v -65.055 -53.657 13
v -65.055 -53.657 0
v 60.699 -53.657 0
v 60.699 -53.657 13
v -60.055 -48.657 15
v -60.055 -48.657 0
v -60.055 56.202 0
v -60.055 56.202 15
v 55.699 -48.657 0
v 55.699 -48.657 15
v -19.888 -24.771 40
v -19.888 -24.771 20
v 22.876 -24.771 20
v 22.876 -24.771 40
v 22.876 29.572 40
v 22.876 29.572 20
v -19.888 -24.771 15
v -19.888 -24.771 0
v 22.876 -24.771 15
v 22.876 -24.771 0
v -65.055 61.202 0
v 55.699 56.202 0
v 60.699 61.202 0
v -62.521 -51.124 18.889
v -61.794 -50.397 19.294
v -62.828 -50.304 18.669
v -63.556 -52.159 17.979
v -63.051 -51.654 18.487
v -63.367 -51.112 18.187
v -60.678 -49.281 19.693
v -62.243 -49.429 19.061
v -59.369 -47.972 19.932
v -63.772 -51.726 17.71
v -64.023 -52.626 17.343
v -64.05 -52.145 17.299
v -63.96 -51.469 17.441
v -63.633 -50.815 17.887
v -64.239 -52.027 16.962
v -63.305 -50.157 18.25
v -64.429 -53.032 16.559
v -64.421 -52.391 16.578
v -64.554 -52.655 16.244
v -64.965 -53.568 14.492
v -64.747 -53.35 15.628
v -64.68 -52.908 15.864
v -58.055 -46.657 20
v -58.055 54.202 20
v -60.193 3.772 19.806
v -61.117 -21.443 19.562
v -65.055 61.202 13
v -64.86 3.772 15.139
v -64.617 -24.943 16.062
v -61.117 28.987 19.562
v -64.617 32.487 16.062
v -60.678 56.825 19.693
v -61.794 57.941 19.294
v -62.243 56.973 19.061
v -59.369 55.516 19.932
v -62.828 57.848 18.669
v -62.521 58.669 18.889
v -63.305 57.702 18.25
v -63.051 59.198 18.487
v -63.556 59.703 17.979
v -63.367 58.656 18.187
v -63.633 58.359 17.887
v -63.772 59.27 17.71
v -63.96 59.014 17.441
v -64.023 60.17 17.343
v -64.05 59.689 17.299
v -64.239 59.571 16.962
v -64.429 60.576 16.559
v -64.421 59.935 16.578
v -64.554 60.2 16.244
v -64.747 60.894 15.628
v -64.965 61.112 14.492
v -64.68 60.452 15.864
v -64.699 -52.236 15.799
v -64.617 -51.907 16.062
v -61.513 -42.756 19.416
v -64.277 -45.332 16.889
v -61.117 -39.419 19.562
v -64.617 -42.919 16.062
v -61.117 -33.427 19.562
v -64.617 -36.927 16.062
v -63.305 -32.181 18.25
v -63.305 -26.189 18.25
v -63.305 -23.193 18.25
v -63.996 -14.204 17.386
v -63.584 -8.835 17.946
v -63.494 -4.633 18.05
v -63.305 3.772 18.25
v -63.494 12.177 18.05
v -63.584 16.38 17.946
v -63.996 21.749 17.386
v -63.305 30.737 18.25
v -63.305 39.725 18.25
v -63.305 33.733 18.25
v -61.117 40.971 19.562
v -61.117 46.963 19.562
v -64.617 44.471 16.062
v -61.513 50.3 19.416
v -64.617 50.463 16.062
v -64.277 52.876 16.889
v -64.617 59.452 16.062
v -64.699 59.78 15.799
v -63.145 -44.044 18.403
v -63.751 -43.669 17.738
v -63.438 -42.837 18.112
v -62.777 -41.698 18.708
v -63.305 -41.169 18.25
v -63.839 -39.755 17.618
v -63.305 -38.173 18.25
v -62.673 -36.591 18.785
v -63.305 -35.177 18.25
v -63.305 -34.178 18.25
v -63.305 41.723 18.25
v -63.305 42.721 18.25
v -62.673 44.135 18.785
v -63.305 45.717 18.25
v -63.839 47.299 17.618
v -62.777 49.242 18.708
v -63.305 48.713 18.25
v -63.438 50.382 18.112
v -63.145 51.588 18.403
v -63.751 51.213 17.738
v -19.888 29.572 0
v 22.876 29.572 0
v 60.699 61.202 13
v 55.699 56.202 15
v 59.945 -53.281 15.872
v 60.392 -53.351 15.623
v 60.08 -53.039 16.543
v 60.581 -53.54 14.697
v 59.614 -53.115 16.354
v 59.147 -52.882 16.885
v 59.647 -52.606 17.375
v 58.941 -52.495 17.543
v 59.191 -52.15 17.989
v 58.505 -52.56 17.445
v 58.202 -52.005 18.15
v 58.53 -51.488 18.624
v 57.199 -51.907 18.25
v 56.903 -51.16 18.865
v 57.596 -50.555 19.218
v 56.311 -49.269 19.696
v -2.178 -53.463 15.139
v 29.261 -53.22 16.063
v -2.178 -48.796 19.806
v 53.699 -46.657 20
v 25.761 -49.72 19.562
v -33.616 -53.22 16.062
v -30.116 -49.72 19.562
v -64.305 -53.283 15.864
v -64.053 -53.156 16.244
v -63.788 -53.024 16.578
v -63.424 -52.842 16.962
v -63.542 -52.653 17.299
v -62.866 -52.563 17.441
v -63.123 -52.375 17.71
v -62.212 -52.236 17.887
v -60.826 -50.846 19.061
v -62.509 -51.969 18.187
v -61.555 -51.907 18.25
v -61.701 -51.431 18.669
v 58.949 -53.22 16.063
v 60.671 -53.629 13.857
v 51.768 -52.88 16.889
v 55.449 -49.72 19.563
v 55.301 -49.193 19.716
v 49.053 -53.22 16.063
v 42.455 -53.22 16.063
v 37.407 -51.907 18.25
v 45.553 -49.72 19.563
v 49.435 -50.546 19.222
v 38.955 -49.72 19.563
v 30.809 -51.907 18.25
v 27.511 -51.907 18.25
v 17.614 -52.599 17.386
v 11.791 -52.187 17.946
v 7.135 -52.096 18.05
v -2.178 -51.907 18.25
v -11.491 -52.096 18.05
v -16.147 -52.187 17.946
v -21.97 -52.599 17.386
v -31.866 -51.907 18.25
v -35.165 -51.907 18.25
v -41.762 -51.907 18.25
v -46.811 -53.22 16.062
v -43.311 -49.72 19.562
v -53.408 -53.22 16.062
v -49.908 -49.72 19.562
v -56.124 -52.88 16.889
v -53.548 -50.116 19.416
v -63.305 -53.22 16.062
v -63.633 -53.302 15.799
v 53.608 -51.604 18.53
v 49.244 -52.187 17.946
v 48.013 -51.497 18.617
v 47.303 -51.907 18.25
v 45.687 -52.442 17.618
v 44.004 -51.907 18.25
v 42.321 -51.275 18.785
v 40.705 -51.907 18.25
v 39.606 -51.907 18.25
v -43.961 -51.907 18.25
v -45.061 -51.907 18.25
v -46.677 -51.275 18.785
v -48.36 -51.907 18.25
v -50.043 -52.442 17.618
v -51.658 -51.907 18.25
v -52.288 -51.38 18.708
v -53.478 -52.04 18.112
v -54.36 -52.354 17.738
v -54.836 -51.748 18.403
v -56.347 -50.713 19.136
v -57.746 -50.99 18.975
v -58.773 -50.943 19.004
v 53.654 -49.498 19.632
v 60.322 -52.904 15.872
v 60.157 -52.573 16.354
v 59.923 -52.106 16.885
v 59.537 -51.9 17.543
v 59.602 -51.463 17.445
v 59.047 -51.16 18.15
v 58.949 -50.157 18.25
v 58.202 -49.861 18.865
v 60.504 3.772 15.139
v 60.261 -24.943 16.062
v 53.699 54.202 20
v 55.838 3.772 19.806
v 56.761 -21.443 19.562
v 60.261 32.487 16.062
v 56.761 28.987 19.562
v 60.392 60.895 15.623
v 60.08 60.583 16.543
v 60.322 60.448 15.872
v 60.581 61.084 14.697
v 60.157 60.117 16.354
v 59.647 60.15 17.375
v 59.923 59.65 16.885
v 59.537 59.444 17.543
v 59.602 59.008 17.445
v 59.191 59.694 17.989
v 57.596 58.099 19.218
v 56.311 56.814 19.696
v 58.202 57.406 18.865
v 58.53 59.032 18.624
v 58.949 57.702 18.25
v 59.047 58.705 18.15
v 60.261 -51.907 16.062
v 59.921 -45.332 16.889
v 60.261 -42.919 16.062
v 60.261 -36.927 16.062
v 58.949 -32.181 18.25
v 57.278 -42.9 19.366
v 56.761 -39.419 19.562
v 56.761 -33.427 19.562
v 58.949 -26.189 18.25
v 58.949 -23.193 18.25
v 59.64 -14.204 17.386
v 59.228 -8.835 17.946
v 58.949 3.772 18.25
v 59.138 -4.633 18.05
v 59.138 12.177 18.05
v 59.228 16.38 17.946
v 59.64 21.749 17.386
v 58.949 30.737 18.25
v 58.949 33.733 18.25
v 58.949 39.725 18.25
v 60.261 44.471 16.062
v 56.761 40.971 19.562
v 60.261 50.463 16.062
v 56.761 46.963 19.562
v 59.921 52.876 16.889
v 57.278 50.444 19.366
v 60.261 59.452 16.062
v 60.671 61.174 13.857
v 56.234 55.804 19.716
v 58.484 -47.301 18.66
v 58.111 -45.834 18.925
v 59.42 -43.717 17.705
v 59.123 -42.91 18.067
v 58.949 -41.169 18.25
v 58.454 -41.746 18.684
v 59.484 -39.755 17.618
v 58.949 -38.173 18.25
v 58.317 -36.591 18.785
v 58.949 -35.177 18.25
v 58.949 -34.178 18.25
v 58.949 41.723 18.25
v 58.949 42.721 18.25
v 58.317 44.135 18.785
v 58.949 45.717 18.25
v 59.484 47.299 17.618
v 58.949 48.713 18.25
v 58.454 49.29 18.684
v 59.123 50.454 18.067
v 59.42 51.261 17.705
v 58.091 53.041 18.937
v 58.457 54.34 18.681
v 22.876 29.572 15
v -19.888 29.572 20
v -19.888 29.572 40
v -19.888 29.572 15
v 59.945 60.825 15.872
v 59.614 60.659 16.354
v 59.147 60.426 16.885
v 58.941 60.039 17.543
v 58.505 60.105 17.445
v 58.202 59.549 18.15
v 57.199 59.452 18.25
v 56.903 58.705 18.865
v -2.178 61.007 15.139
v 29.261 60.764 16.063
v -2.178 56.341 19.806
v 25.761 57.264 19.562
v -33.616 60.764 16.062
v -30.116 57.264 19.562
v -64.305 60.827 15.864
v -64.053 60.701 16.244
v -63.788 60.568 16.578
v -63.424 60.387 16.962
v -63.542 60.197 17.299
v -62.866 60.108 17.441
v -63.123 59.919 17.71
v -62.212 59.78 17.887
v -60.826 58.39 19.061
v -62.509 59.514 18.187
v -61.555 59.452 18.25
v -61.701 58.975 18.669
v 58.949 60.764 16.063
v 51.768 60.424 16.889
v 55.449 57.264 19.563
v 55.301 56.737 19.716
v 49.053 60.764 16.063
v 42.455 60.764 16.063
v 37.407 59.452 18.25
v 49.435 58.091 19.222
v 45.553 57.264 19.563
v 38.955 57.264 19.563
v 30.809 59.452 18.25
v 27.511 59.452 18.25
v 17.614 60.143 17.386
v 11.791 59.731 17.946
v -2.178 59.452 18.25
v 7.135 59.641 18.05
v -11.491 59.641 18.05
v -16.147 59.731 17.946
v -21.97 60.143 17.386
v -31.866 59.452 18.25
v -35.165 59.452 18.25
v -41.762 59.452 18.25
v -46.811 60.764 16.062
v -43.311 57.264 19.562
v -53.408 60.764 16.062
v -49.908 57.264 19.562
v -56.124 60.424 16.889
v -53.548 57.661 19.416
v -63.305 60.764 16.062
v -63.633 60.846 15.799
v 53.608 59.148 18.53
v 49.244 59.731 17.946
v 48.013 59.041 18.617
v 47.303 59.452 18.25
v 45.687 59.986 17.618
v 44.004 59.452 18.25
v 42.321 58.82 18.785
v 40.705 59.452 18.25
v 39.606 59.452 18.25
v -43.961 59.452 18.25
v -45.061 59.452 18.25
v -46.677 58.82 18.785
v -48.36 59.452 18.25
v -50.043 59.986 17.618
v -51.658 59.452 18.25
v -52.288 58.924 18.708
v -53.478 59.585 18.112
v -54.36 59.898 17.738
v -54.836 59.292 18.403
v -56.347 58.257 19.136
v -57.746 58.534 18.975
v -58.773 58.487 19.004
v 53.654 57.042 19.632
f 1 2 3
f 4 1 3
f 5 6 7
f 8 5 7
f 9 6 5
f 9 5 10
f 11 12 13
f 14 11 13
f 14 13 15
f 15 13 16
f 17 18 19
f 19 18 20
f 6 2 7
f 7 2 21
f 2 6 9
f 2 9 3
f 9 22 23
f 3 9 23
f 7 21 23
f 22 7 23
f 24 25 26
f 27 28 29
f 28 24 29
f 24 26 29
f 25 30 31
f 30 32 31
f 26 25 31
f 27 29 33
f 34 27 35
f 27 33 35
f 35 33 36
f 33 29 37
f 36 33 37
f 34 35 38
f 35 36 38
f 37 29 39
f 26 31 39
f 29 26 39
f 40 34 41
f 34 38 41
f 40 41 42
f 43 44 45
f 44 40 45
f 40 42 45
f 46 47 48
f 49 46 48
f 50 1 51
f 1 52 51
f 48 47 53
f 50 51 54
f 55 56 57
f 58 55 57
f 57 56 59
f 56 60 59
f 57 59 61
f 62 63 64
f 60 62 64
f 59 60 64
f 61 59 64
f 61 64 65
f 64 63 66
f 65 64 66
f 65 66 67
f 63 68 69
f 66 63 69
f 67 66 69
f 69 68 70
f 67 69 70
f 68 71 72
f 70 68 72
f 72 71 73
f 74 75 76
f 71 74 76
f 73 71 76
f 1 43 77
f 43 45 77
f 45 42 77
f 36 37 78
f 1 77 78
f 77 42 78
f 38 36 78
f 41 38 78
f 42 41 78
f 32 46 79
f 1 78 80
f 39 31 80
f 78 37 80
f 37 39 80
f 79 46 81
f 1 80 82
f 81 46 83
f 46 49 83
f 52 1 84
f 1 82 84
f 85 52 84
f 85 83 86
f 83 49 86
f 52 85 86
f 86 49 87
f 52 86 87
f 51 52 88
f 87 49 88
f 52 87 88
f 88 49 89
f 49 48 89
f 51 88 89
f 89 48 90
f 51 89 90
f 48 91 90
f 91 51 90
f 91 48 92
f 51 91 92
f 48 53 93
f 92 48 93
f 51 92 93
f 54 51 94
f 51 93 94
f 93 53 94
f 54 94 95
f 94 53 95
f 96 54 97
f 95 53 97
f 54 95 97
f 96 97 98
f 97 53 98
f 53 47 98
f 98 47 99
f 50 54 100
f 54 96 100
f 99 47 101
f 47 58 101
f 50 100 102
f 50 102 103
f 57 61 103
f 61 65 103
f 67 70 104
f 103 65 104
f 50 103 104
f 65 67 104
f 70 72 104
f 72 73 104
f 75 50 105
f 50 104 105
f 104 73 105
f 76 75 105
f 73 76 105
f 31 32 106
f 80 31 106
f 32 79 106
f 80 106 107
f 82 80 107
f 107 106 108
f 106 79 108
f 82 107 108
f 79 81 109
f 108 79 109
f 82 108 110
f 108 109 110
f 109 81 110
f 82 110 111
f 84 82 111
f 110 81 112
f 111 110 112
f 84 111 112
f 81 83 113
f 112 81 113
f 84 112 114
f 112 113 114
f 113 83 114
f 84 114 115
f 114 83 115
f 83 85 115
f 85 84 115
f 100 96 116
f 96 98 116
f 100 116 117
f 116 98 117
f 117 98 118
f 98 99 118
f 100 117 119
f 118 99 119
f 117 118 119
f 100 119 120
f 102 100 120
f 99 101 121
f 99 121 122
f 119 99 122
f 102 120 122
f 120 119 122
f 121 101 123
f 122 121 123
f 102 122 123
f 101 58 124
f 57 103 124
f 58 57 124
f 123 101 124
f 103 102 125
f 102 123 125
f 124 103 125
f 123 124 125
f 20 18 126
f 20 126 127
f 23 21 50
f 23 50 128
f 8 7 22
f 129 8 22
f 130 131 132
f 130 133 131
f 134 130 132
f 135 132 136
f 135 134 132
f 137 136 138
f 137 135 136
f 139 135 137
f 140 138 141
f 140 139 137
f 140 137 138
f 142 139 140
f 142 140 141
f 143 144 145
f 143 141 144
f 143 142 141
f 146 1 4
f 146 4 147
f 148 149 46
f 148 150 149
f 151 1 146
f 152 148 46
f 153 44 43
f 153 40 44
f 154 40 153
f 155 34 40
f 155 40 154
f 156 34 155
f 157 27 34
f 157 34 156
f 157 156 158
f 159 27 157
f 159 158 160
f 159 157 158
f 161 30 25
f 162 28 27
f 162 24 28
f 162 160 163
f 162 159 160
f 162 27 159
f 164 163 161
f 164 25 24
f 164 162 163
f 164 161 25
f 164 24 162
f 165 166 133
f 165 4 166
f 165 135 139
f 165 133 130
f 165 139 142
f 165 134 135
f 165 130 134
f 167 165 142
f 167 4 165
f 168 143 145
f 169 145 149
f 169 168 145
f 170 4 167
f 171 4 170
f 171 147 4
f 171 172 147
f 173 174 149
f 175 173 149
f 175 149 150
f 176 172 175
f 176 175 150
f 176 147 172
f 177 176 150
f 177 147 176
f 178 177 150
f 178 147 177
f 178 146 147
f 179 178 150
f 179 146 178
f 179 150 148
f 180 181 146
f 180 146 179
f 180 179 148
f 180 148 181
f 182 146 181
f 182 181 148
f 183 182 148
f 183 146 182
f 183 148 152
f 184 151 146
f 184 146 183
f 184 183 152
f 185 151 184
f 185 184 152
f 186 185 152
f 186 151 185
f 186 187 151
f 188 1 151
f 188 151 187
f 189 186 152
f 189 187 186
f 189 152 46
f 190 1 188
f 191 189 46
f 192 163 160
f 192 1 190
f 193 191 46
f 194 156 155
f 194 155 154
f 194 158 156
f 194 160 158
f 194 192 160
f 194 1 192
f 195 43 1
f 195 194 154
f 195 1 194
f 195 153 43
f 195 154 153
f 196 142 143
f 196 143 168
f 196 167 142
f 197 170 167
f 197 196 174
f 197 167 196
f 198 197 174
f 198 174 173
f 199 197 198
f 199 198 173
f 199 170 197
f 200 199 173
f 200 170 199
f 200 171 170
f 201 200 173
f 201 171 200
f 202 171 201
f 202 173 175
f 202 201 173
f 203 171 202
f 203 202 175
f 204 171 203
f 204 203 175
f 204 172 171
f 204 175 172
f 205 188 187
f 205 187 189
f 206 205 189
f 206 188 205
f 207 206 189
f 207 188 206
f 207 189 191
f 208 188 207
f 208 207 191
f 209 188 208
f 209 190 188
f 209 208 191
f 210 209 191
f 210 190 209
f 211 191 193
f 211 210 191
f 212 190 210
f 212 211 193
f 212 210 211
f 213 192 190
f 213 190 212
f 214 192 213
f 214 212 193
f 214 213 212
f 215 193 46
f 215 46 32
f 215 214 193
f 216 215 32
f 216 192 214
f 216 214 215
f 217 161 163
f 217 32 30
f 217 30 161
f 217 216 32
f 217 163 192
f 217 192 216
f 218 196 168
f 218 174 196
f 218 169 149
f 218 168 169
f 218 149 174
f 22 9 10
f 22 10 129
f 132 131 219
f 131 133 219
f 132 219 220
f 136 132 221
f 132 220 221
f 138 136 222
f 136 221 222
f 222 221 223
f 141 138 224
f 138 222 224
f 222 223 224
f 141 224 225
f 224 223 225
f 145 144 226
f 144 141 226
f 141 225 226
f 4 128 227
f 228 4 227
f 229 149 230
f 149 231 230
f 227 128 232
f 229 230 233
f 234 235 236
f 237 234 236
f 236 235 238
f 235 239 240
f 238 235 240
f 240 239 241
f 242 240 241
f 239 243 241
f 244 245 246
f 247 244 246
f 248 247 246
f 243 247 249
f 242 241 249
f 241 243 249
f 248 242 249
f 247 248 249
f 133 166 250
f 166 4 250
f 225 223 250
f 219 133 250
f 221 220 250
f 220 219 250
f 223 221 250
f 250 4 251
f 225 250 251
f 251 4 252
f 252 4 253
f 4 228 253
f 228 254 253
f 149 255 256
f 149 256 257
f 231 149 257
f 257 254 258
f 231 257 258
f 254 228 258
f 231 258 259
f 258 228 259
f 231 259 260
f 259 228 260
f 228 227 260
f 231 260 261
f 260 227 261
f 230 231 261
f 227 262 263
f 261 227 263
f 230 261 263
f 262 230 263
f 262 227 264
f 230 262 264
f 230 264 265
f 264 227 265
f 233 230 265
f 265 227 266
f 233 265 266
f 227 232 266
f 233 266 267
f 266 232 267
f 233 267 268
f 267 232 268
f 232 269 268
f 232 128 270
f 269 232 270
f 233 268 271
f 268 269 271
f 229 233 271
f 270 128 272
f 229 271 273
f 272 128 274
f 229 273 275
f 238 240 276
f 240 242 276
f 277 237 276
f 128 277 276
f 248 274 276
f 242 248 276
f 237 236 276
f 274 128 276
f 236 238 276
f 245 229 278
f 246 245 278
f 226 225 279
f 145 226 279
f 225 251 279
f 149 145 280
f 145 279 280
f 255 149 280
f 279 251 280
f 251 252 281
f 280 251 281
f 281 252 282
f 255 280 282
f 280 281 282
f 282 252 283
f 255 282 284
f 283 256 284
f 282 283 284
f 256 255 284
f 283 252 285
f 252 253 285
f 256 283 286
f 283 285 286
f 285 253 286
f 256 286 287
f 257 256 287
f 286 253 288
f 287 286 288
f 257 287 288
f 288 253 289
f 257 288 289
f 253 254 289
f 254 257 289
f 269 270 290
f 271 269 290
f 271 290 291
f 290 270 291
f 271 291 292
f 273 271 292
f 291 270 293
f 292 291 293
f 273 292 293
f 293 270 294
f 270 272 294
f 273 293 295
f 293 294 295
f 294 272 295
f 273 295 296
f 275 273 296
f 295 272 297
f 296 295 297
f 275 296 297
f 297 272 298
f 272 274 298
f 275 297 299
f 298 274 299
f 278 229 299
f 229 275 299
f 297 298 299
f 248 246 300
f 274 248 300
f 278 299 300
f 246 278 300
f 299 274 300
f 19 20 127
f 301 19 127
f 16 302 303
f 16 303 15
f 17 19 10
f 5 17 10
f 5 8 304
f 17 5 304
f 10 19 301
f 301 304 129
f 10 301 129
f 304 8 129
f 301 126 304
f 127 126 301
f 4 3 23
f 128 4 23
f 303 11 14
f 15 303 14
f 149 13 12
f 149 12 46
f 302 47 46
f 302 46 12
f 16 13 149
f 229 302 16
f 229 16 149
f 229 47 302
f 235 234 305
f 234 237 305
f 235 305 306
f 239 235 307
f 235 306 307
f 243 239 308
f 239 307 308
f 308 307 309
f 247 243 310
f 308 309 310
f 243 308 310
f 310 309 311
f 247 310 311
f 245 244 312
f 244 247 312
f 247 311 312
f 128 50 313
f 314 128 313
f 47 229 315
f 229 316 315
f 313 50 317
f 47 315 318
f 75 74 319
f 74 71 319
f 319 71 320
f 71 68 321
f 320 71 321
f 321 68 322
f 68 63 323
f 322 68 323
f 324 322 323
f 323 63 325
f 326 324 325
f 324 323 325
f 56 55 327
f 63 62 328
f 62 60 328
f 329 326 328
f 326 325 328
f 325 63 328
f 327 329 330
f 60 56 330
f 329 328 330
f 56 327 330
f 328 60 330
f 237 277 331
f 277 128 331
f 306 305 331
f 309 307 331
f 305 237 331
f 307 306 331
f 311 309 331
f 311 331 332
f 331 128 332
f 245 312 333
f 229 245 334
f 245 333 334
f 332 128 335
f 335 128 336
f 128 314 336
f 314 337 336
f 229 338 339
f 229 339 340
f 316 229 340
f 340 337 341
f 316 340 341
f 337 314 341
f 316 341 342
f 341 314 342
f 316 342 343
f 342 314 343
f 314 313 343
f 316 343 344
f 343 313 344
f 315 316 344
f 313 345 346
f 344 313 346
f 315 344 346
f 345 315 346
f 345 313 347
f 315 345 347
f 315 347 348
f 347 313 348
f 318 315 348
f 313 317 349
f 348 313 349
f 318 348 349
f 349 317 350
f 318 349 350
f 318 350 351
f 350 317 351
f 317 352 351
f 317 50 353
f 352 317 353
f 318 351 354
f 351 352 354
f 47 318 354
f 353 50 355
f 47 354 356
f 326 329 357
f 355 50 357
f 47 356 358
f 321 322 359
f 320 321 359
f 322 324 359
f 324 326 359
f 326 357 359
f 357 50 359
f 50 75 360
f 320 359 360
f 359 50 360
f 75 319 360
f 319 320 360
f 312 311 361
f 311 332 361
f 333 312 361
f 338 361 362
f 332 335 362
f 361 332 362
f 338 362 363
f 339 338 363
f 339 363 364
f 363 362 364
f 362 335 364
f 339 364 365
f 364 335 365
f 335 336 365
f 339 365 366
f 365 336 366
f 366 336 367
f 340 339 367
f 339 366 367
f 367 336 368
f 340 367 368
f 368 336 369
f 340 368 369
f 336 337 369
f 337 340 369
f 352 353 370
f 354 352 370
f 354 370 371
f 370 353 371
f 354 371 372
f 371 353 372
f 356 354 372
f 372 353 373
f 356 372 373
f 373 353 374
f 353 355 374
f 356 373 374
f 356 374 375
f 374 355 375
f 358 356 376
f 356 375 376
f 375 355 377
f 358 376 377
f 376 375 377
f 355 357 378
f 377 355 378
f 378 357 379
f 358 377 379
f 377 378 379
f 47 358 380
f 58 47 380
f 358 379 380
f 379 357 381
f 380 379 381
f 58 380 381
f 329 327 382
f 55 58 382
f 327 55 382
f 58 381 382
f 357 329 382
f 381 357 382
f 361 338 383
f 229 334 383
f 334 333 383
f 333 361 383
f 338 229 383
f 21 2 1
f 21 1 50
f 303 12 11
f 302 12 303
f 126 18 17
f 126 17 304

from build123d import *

# Parameters (mm, degrees)
F1_W        = 125.7533915341
F1_H        = 114.8591116071
F2_DEPTH    = 20
F3_T        = -5
F5_W        = 42.7649468184
F5_H        = 54.3430875987
F6_DEPTH    = 40
F7_T1_DEPTH = 149.8591116071
F7_T3_DEPTH = 160.7533915341


# Not quite as in the source:
# - a fillet or chamfer that OpenCascade refuses, or shapes differently, is made with other operations: its cross-section is extruded or revolved along the edge and cut away or added


with BuildPart() as f2:
    # F1 (on face) → F2 (new body)
    with BuildSketch(Plane.XY):
        with Locations((-2.1778326482, 3.7721171975)):
            Rectangle(F1_W, F1_H)
    extrude(amount=F2_DEPTH)

    # F3
    f3_openings = [f2.faces().sort_by_distance(p)[0] for p in [
        (-2.177833, 3.772117, 0),
    ]]
    offset(amount=F3_T, openings=f3_openings)

    # F5 (on Top) → F6 (join)
    with BuildSketch(Plane.XY):
        with Locations((1.4939792454, 2.4008983746)):
            Rectangle(F5_W, F5_H)
    extrude(amount=F6_DEPTH)

    # F7: fillet of radius 7 on 4 edges, made by hand

    # F7_s2 → F7_t1 (cut)
    with BuildSketch(Plane.XZ.offset(-78.7016730011)):
        with BuildLine():
            add(Edge.make_bspline(
                [(-58.0545284152, 20), (-65.0545284152, 20), (-65.0545284152, 13)],
                knots=[0, 0, 0, 1, 1, 1], degree=2, weights=[1, 1, 1]))
            Line((-65.0545284152, 13), (-65.0545284152, 20))
            Line((-65.0545284152, 20), (-58.0545284152, 20))
        make_face()
        with BuildLine():
            add(Edge.make_bspline(
                [(60.6988631189, 13), (60.6988631189, 20), (53.6988631189, 20)],
                knots=[0, 0, 0, 1, 1, 1], degree=2, weights=[1, 1, 1]))
            Line((53.6988631189, 20), (60.6988631189, 20))
            Line((60.6988631189, 20), (60.6988631189, 13))
        make_face()
    extrude(amount=F7_T1_DEPTH, mode=Mode.SUBTRACT)

    # F7_s4 → F7_t3 (cut)
    with BuildSketch(Plane.YZ.offset(-82.5545284152)):
        with BuildLine():
            add(Edge.make_bspline(
                [(-53.657438606, 13), (-53.657438606, 20), (-46.657438606, 20)],
                knots=[0, 0, 0, 1, 1, 1], degree=2, weights=[1, 1, 1]))
            Line((-46.657438606, 20), (-53.657438606, 20))
            Line((-53.657438606, 20), (-53.657438606, 13))
        make_face()
        with BuildLine():
            add(Edge.make_bspline(
                [(61.2016730011, 13), (61.2016730011, 20), (54.2016730011, 20)],
                knots=[0, 0, 0, 1, 1, 1], degree=2, weights=[1, 1, 1]))
            Line((54.2016730011, 20), (61.2016730011, 20))
            Line((61.2016730011, 20), (61.2016730011, 13))
        make_face()
    extrude(amount=F7_T3_DEPTH, mode=Mode.SUBTRACT)


solid = f2.part
